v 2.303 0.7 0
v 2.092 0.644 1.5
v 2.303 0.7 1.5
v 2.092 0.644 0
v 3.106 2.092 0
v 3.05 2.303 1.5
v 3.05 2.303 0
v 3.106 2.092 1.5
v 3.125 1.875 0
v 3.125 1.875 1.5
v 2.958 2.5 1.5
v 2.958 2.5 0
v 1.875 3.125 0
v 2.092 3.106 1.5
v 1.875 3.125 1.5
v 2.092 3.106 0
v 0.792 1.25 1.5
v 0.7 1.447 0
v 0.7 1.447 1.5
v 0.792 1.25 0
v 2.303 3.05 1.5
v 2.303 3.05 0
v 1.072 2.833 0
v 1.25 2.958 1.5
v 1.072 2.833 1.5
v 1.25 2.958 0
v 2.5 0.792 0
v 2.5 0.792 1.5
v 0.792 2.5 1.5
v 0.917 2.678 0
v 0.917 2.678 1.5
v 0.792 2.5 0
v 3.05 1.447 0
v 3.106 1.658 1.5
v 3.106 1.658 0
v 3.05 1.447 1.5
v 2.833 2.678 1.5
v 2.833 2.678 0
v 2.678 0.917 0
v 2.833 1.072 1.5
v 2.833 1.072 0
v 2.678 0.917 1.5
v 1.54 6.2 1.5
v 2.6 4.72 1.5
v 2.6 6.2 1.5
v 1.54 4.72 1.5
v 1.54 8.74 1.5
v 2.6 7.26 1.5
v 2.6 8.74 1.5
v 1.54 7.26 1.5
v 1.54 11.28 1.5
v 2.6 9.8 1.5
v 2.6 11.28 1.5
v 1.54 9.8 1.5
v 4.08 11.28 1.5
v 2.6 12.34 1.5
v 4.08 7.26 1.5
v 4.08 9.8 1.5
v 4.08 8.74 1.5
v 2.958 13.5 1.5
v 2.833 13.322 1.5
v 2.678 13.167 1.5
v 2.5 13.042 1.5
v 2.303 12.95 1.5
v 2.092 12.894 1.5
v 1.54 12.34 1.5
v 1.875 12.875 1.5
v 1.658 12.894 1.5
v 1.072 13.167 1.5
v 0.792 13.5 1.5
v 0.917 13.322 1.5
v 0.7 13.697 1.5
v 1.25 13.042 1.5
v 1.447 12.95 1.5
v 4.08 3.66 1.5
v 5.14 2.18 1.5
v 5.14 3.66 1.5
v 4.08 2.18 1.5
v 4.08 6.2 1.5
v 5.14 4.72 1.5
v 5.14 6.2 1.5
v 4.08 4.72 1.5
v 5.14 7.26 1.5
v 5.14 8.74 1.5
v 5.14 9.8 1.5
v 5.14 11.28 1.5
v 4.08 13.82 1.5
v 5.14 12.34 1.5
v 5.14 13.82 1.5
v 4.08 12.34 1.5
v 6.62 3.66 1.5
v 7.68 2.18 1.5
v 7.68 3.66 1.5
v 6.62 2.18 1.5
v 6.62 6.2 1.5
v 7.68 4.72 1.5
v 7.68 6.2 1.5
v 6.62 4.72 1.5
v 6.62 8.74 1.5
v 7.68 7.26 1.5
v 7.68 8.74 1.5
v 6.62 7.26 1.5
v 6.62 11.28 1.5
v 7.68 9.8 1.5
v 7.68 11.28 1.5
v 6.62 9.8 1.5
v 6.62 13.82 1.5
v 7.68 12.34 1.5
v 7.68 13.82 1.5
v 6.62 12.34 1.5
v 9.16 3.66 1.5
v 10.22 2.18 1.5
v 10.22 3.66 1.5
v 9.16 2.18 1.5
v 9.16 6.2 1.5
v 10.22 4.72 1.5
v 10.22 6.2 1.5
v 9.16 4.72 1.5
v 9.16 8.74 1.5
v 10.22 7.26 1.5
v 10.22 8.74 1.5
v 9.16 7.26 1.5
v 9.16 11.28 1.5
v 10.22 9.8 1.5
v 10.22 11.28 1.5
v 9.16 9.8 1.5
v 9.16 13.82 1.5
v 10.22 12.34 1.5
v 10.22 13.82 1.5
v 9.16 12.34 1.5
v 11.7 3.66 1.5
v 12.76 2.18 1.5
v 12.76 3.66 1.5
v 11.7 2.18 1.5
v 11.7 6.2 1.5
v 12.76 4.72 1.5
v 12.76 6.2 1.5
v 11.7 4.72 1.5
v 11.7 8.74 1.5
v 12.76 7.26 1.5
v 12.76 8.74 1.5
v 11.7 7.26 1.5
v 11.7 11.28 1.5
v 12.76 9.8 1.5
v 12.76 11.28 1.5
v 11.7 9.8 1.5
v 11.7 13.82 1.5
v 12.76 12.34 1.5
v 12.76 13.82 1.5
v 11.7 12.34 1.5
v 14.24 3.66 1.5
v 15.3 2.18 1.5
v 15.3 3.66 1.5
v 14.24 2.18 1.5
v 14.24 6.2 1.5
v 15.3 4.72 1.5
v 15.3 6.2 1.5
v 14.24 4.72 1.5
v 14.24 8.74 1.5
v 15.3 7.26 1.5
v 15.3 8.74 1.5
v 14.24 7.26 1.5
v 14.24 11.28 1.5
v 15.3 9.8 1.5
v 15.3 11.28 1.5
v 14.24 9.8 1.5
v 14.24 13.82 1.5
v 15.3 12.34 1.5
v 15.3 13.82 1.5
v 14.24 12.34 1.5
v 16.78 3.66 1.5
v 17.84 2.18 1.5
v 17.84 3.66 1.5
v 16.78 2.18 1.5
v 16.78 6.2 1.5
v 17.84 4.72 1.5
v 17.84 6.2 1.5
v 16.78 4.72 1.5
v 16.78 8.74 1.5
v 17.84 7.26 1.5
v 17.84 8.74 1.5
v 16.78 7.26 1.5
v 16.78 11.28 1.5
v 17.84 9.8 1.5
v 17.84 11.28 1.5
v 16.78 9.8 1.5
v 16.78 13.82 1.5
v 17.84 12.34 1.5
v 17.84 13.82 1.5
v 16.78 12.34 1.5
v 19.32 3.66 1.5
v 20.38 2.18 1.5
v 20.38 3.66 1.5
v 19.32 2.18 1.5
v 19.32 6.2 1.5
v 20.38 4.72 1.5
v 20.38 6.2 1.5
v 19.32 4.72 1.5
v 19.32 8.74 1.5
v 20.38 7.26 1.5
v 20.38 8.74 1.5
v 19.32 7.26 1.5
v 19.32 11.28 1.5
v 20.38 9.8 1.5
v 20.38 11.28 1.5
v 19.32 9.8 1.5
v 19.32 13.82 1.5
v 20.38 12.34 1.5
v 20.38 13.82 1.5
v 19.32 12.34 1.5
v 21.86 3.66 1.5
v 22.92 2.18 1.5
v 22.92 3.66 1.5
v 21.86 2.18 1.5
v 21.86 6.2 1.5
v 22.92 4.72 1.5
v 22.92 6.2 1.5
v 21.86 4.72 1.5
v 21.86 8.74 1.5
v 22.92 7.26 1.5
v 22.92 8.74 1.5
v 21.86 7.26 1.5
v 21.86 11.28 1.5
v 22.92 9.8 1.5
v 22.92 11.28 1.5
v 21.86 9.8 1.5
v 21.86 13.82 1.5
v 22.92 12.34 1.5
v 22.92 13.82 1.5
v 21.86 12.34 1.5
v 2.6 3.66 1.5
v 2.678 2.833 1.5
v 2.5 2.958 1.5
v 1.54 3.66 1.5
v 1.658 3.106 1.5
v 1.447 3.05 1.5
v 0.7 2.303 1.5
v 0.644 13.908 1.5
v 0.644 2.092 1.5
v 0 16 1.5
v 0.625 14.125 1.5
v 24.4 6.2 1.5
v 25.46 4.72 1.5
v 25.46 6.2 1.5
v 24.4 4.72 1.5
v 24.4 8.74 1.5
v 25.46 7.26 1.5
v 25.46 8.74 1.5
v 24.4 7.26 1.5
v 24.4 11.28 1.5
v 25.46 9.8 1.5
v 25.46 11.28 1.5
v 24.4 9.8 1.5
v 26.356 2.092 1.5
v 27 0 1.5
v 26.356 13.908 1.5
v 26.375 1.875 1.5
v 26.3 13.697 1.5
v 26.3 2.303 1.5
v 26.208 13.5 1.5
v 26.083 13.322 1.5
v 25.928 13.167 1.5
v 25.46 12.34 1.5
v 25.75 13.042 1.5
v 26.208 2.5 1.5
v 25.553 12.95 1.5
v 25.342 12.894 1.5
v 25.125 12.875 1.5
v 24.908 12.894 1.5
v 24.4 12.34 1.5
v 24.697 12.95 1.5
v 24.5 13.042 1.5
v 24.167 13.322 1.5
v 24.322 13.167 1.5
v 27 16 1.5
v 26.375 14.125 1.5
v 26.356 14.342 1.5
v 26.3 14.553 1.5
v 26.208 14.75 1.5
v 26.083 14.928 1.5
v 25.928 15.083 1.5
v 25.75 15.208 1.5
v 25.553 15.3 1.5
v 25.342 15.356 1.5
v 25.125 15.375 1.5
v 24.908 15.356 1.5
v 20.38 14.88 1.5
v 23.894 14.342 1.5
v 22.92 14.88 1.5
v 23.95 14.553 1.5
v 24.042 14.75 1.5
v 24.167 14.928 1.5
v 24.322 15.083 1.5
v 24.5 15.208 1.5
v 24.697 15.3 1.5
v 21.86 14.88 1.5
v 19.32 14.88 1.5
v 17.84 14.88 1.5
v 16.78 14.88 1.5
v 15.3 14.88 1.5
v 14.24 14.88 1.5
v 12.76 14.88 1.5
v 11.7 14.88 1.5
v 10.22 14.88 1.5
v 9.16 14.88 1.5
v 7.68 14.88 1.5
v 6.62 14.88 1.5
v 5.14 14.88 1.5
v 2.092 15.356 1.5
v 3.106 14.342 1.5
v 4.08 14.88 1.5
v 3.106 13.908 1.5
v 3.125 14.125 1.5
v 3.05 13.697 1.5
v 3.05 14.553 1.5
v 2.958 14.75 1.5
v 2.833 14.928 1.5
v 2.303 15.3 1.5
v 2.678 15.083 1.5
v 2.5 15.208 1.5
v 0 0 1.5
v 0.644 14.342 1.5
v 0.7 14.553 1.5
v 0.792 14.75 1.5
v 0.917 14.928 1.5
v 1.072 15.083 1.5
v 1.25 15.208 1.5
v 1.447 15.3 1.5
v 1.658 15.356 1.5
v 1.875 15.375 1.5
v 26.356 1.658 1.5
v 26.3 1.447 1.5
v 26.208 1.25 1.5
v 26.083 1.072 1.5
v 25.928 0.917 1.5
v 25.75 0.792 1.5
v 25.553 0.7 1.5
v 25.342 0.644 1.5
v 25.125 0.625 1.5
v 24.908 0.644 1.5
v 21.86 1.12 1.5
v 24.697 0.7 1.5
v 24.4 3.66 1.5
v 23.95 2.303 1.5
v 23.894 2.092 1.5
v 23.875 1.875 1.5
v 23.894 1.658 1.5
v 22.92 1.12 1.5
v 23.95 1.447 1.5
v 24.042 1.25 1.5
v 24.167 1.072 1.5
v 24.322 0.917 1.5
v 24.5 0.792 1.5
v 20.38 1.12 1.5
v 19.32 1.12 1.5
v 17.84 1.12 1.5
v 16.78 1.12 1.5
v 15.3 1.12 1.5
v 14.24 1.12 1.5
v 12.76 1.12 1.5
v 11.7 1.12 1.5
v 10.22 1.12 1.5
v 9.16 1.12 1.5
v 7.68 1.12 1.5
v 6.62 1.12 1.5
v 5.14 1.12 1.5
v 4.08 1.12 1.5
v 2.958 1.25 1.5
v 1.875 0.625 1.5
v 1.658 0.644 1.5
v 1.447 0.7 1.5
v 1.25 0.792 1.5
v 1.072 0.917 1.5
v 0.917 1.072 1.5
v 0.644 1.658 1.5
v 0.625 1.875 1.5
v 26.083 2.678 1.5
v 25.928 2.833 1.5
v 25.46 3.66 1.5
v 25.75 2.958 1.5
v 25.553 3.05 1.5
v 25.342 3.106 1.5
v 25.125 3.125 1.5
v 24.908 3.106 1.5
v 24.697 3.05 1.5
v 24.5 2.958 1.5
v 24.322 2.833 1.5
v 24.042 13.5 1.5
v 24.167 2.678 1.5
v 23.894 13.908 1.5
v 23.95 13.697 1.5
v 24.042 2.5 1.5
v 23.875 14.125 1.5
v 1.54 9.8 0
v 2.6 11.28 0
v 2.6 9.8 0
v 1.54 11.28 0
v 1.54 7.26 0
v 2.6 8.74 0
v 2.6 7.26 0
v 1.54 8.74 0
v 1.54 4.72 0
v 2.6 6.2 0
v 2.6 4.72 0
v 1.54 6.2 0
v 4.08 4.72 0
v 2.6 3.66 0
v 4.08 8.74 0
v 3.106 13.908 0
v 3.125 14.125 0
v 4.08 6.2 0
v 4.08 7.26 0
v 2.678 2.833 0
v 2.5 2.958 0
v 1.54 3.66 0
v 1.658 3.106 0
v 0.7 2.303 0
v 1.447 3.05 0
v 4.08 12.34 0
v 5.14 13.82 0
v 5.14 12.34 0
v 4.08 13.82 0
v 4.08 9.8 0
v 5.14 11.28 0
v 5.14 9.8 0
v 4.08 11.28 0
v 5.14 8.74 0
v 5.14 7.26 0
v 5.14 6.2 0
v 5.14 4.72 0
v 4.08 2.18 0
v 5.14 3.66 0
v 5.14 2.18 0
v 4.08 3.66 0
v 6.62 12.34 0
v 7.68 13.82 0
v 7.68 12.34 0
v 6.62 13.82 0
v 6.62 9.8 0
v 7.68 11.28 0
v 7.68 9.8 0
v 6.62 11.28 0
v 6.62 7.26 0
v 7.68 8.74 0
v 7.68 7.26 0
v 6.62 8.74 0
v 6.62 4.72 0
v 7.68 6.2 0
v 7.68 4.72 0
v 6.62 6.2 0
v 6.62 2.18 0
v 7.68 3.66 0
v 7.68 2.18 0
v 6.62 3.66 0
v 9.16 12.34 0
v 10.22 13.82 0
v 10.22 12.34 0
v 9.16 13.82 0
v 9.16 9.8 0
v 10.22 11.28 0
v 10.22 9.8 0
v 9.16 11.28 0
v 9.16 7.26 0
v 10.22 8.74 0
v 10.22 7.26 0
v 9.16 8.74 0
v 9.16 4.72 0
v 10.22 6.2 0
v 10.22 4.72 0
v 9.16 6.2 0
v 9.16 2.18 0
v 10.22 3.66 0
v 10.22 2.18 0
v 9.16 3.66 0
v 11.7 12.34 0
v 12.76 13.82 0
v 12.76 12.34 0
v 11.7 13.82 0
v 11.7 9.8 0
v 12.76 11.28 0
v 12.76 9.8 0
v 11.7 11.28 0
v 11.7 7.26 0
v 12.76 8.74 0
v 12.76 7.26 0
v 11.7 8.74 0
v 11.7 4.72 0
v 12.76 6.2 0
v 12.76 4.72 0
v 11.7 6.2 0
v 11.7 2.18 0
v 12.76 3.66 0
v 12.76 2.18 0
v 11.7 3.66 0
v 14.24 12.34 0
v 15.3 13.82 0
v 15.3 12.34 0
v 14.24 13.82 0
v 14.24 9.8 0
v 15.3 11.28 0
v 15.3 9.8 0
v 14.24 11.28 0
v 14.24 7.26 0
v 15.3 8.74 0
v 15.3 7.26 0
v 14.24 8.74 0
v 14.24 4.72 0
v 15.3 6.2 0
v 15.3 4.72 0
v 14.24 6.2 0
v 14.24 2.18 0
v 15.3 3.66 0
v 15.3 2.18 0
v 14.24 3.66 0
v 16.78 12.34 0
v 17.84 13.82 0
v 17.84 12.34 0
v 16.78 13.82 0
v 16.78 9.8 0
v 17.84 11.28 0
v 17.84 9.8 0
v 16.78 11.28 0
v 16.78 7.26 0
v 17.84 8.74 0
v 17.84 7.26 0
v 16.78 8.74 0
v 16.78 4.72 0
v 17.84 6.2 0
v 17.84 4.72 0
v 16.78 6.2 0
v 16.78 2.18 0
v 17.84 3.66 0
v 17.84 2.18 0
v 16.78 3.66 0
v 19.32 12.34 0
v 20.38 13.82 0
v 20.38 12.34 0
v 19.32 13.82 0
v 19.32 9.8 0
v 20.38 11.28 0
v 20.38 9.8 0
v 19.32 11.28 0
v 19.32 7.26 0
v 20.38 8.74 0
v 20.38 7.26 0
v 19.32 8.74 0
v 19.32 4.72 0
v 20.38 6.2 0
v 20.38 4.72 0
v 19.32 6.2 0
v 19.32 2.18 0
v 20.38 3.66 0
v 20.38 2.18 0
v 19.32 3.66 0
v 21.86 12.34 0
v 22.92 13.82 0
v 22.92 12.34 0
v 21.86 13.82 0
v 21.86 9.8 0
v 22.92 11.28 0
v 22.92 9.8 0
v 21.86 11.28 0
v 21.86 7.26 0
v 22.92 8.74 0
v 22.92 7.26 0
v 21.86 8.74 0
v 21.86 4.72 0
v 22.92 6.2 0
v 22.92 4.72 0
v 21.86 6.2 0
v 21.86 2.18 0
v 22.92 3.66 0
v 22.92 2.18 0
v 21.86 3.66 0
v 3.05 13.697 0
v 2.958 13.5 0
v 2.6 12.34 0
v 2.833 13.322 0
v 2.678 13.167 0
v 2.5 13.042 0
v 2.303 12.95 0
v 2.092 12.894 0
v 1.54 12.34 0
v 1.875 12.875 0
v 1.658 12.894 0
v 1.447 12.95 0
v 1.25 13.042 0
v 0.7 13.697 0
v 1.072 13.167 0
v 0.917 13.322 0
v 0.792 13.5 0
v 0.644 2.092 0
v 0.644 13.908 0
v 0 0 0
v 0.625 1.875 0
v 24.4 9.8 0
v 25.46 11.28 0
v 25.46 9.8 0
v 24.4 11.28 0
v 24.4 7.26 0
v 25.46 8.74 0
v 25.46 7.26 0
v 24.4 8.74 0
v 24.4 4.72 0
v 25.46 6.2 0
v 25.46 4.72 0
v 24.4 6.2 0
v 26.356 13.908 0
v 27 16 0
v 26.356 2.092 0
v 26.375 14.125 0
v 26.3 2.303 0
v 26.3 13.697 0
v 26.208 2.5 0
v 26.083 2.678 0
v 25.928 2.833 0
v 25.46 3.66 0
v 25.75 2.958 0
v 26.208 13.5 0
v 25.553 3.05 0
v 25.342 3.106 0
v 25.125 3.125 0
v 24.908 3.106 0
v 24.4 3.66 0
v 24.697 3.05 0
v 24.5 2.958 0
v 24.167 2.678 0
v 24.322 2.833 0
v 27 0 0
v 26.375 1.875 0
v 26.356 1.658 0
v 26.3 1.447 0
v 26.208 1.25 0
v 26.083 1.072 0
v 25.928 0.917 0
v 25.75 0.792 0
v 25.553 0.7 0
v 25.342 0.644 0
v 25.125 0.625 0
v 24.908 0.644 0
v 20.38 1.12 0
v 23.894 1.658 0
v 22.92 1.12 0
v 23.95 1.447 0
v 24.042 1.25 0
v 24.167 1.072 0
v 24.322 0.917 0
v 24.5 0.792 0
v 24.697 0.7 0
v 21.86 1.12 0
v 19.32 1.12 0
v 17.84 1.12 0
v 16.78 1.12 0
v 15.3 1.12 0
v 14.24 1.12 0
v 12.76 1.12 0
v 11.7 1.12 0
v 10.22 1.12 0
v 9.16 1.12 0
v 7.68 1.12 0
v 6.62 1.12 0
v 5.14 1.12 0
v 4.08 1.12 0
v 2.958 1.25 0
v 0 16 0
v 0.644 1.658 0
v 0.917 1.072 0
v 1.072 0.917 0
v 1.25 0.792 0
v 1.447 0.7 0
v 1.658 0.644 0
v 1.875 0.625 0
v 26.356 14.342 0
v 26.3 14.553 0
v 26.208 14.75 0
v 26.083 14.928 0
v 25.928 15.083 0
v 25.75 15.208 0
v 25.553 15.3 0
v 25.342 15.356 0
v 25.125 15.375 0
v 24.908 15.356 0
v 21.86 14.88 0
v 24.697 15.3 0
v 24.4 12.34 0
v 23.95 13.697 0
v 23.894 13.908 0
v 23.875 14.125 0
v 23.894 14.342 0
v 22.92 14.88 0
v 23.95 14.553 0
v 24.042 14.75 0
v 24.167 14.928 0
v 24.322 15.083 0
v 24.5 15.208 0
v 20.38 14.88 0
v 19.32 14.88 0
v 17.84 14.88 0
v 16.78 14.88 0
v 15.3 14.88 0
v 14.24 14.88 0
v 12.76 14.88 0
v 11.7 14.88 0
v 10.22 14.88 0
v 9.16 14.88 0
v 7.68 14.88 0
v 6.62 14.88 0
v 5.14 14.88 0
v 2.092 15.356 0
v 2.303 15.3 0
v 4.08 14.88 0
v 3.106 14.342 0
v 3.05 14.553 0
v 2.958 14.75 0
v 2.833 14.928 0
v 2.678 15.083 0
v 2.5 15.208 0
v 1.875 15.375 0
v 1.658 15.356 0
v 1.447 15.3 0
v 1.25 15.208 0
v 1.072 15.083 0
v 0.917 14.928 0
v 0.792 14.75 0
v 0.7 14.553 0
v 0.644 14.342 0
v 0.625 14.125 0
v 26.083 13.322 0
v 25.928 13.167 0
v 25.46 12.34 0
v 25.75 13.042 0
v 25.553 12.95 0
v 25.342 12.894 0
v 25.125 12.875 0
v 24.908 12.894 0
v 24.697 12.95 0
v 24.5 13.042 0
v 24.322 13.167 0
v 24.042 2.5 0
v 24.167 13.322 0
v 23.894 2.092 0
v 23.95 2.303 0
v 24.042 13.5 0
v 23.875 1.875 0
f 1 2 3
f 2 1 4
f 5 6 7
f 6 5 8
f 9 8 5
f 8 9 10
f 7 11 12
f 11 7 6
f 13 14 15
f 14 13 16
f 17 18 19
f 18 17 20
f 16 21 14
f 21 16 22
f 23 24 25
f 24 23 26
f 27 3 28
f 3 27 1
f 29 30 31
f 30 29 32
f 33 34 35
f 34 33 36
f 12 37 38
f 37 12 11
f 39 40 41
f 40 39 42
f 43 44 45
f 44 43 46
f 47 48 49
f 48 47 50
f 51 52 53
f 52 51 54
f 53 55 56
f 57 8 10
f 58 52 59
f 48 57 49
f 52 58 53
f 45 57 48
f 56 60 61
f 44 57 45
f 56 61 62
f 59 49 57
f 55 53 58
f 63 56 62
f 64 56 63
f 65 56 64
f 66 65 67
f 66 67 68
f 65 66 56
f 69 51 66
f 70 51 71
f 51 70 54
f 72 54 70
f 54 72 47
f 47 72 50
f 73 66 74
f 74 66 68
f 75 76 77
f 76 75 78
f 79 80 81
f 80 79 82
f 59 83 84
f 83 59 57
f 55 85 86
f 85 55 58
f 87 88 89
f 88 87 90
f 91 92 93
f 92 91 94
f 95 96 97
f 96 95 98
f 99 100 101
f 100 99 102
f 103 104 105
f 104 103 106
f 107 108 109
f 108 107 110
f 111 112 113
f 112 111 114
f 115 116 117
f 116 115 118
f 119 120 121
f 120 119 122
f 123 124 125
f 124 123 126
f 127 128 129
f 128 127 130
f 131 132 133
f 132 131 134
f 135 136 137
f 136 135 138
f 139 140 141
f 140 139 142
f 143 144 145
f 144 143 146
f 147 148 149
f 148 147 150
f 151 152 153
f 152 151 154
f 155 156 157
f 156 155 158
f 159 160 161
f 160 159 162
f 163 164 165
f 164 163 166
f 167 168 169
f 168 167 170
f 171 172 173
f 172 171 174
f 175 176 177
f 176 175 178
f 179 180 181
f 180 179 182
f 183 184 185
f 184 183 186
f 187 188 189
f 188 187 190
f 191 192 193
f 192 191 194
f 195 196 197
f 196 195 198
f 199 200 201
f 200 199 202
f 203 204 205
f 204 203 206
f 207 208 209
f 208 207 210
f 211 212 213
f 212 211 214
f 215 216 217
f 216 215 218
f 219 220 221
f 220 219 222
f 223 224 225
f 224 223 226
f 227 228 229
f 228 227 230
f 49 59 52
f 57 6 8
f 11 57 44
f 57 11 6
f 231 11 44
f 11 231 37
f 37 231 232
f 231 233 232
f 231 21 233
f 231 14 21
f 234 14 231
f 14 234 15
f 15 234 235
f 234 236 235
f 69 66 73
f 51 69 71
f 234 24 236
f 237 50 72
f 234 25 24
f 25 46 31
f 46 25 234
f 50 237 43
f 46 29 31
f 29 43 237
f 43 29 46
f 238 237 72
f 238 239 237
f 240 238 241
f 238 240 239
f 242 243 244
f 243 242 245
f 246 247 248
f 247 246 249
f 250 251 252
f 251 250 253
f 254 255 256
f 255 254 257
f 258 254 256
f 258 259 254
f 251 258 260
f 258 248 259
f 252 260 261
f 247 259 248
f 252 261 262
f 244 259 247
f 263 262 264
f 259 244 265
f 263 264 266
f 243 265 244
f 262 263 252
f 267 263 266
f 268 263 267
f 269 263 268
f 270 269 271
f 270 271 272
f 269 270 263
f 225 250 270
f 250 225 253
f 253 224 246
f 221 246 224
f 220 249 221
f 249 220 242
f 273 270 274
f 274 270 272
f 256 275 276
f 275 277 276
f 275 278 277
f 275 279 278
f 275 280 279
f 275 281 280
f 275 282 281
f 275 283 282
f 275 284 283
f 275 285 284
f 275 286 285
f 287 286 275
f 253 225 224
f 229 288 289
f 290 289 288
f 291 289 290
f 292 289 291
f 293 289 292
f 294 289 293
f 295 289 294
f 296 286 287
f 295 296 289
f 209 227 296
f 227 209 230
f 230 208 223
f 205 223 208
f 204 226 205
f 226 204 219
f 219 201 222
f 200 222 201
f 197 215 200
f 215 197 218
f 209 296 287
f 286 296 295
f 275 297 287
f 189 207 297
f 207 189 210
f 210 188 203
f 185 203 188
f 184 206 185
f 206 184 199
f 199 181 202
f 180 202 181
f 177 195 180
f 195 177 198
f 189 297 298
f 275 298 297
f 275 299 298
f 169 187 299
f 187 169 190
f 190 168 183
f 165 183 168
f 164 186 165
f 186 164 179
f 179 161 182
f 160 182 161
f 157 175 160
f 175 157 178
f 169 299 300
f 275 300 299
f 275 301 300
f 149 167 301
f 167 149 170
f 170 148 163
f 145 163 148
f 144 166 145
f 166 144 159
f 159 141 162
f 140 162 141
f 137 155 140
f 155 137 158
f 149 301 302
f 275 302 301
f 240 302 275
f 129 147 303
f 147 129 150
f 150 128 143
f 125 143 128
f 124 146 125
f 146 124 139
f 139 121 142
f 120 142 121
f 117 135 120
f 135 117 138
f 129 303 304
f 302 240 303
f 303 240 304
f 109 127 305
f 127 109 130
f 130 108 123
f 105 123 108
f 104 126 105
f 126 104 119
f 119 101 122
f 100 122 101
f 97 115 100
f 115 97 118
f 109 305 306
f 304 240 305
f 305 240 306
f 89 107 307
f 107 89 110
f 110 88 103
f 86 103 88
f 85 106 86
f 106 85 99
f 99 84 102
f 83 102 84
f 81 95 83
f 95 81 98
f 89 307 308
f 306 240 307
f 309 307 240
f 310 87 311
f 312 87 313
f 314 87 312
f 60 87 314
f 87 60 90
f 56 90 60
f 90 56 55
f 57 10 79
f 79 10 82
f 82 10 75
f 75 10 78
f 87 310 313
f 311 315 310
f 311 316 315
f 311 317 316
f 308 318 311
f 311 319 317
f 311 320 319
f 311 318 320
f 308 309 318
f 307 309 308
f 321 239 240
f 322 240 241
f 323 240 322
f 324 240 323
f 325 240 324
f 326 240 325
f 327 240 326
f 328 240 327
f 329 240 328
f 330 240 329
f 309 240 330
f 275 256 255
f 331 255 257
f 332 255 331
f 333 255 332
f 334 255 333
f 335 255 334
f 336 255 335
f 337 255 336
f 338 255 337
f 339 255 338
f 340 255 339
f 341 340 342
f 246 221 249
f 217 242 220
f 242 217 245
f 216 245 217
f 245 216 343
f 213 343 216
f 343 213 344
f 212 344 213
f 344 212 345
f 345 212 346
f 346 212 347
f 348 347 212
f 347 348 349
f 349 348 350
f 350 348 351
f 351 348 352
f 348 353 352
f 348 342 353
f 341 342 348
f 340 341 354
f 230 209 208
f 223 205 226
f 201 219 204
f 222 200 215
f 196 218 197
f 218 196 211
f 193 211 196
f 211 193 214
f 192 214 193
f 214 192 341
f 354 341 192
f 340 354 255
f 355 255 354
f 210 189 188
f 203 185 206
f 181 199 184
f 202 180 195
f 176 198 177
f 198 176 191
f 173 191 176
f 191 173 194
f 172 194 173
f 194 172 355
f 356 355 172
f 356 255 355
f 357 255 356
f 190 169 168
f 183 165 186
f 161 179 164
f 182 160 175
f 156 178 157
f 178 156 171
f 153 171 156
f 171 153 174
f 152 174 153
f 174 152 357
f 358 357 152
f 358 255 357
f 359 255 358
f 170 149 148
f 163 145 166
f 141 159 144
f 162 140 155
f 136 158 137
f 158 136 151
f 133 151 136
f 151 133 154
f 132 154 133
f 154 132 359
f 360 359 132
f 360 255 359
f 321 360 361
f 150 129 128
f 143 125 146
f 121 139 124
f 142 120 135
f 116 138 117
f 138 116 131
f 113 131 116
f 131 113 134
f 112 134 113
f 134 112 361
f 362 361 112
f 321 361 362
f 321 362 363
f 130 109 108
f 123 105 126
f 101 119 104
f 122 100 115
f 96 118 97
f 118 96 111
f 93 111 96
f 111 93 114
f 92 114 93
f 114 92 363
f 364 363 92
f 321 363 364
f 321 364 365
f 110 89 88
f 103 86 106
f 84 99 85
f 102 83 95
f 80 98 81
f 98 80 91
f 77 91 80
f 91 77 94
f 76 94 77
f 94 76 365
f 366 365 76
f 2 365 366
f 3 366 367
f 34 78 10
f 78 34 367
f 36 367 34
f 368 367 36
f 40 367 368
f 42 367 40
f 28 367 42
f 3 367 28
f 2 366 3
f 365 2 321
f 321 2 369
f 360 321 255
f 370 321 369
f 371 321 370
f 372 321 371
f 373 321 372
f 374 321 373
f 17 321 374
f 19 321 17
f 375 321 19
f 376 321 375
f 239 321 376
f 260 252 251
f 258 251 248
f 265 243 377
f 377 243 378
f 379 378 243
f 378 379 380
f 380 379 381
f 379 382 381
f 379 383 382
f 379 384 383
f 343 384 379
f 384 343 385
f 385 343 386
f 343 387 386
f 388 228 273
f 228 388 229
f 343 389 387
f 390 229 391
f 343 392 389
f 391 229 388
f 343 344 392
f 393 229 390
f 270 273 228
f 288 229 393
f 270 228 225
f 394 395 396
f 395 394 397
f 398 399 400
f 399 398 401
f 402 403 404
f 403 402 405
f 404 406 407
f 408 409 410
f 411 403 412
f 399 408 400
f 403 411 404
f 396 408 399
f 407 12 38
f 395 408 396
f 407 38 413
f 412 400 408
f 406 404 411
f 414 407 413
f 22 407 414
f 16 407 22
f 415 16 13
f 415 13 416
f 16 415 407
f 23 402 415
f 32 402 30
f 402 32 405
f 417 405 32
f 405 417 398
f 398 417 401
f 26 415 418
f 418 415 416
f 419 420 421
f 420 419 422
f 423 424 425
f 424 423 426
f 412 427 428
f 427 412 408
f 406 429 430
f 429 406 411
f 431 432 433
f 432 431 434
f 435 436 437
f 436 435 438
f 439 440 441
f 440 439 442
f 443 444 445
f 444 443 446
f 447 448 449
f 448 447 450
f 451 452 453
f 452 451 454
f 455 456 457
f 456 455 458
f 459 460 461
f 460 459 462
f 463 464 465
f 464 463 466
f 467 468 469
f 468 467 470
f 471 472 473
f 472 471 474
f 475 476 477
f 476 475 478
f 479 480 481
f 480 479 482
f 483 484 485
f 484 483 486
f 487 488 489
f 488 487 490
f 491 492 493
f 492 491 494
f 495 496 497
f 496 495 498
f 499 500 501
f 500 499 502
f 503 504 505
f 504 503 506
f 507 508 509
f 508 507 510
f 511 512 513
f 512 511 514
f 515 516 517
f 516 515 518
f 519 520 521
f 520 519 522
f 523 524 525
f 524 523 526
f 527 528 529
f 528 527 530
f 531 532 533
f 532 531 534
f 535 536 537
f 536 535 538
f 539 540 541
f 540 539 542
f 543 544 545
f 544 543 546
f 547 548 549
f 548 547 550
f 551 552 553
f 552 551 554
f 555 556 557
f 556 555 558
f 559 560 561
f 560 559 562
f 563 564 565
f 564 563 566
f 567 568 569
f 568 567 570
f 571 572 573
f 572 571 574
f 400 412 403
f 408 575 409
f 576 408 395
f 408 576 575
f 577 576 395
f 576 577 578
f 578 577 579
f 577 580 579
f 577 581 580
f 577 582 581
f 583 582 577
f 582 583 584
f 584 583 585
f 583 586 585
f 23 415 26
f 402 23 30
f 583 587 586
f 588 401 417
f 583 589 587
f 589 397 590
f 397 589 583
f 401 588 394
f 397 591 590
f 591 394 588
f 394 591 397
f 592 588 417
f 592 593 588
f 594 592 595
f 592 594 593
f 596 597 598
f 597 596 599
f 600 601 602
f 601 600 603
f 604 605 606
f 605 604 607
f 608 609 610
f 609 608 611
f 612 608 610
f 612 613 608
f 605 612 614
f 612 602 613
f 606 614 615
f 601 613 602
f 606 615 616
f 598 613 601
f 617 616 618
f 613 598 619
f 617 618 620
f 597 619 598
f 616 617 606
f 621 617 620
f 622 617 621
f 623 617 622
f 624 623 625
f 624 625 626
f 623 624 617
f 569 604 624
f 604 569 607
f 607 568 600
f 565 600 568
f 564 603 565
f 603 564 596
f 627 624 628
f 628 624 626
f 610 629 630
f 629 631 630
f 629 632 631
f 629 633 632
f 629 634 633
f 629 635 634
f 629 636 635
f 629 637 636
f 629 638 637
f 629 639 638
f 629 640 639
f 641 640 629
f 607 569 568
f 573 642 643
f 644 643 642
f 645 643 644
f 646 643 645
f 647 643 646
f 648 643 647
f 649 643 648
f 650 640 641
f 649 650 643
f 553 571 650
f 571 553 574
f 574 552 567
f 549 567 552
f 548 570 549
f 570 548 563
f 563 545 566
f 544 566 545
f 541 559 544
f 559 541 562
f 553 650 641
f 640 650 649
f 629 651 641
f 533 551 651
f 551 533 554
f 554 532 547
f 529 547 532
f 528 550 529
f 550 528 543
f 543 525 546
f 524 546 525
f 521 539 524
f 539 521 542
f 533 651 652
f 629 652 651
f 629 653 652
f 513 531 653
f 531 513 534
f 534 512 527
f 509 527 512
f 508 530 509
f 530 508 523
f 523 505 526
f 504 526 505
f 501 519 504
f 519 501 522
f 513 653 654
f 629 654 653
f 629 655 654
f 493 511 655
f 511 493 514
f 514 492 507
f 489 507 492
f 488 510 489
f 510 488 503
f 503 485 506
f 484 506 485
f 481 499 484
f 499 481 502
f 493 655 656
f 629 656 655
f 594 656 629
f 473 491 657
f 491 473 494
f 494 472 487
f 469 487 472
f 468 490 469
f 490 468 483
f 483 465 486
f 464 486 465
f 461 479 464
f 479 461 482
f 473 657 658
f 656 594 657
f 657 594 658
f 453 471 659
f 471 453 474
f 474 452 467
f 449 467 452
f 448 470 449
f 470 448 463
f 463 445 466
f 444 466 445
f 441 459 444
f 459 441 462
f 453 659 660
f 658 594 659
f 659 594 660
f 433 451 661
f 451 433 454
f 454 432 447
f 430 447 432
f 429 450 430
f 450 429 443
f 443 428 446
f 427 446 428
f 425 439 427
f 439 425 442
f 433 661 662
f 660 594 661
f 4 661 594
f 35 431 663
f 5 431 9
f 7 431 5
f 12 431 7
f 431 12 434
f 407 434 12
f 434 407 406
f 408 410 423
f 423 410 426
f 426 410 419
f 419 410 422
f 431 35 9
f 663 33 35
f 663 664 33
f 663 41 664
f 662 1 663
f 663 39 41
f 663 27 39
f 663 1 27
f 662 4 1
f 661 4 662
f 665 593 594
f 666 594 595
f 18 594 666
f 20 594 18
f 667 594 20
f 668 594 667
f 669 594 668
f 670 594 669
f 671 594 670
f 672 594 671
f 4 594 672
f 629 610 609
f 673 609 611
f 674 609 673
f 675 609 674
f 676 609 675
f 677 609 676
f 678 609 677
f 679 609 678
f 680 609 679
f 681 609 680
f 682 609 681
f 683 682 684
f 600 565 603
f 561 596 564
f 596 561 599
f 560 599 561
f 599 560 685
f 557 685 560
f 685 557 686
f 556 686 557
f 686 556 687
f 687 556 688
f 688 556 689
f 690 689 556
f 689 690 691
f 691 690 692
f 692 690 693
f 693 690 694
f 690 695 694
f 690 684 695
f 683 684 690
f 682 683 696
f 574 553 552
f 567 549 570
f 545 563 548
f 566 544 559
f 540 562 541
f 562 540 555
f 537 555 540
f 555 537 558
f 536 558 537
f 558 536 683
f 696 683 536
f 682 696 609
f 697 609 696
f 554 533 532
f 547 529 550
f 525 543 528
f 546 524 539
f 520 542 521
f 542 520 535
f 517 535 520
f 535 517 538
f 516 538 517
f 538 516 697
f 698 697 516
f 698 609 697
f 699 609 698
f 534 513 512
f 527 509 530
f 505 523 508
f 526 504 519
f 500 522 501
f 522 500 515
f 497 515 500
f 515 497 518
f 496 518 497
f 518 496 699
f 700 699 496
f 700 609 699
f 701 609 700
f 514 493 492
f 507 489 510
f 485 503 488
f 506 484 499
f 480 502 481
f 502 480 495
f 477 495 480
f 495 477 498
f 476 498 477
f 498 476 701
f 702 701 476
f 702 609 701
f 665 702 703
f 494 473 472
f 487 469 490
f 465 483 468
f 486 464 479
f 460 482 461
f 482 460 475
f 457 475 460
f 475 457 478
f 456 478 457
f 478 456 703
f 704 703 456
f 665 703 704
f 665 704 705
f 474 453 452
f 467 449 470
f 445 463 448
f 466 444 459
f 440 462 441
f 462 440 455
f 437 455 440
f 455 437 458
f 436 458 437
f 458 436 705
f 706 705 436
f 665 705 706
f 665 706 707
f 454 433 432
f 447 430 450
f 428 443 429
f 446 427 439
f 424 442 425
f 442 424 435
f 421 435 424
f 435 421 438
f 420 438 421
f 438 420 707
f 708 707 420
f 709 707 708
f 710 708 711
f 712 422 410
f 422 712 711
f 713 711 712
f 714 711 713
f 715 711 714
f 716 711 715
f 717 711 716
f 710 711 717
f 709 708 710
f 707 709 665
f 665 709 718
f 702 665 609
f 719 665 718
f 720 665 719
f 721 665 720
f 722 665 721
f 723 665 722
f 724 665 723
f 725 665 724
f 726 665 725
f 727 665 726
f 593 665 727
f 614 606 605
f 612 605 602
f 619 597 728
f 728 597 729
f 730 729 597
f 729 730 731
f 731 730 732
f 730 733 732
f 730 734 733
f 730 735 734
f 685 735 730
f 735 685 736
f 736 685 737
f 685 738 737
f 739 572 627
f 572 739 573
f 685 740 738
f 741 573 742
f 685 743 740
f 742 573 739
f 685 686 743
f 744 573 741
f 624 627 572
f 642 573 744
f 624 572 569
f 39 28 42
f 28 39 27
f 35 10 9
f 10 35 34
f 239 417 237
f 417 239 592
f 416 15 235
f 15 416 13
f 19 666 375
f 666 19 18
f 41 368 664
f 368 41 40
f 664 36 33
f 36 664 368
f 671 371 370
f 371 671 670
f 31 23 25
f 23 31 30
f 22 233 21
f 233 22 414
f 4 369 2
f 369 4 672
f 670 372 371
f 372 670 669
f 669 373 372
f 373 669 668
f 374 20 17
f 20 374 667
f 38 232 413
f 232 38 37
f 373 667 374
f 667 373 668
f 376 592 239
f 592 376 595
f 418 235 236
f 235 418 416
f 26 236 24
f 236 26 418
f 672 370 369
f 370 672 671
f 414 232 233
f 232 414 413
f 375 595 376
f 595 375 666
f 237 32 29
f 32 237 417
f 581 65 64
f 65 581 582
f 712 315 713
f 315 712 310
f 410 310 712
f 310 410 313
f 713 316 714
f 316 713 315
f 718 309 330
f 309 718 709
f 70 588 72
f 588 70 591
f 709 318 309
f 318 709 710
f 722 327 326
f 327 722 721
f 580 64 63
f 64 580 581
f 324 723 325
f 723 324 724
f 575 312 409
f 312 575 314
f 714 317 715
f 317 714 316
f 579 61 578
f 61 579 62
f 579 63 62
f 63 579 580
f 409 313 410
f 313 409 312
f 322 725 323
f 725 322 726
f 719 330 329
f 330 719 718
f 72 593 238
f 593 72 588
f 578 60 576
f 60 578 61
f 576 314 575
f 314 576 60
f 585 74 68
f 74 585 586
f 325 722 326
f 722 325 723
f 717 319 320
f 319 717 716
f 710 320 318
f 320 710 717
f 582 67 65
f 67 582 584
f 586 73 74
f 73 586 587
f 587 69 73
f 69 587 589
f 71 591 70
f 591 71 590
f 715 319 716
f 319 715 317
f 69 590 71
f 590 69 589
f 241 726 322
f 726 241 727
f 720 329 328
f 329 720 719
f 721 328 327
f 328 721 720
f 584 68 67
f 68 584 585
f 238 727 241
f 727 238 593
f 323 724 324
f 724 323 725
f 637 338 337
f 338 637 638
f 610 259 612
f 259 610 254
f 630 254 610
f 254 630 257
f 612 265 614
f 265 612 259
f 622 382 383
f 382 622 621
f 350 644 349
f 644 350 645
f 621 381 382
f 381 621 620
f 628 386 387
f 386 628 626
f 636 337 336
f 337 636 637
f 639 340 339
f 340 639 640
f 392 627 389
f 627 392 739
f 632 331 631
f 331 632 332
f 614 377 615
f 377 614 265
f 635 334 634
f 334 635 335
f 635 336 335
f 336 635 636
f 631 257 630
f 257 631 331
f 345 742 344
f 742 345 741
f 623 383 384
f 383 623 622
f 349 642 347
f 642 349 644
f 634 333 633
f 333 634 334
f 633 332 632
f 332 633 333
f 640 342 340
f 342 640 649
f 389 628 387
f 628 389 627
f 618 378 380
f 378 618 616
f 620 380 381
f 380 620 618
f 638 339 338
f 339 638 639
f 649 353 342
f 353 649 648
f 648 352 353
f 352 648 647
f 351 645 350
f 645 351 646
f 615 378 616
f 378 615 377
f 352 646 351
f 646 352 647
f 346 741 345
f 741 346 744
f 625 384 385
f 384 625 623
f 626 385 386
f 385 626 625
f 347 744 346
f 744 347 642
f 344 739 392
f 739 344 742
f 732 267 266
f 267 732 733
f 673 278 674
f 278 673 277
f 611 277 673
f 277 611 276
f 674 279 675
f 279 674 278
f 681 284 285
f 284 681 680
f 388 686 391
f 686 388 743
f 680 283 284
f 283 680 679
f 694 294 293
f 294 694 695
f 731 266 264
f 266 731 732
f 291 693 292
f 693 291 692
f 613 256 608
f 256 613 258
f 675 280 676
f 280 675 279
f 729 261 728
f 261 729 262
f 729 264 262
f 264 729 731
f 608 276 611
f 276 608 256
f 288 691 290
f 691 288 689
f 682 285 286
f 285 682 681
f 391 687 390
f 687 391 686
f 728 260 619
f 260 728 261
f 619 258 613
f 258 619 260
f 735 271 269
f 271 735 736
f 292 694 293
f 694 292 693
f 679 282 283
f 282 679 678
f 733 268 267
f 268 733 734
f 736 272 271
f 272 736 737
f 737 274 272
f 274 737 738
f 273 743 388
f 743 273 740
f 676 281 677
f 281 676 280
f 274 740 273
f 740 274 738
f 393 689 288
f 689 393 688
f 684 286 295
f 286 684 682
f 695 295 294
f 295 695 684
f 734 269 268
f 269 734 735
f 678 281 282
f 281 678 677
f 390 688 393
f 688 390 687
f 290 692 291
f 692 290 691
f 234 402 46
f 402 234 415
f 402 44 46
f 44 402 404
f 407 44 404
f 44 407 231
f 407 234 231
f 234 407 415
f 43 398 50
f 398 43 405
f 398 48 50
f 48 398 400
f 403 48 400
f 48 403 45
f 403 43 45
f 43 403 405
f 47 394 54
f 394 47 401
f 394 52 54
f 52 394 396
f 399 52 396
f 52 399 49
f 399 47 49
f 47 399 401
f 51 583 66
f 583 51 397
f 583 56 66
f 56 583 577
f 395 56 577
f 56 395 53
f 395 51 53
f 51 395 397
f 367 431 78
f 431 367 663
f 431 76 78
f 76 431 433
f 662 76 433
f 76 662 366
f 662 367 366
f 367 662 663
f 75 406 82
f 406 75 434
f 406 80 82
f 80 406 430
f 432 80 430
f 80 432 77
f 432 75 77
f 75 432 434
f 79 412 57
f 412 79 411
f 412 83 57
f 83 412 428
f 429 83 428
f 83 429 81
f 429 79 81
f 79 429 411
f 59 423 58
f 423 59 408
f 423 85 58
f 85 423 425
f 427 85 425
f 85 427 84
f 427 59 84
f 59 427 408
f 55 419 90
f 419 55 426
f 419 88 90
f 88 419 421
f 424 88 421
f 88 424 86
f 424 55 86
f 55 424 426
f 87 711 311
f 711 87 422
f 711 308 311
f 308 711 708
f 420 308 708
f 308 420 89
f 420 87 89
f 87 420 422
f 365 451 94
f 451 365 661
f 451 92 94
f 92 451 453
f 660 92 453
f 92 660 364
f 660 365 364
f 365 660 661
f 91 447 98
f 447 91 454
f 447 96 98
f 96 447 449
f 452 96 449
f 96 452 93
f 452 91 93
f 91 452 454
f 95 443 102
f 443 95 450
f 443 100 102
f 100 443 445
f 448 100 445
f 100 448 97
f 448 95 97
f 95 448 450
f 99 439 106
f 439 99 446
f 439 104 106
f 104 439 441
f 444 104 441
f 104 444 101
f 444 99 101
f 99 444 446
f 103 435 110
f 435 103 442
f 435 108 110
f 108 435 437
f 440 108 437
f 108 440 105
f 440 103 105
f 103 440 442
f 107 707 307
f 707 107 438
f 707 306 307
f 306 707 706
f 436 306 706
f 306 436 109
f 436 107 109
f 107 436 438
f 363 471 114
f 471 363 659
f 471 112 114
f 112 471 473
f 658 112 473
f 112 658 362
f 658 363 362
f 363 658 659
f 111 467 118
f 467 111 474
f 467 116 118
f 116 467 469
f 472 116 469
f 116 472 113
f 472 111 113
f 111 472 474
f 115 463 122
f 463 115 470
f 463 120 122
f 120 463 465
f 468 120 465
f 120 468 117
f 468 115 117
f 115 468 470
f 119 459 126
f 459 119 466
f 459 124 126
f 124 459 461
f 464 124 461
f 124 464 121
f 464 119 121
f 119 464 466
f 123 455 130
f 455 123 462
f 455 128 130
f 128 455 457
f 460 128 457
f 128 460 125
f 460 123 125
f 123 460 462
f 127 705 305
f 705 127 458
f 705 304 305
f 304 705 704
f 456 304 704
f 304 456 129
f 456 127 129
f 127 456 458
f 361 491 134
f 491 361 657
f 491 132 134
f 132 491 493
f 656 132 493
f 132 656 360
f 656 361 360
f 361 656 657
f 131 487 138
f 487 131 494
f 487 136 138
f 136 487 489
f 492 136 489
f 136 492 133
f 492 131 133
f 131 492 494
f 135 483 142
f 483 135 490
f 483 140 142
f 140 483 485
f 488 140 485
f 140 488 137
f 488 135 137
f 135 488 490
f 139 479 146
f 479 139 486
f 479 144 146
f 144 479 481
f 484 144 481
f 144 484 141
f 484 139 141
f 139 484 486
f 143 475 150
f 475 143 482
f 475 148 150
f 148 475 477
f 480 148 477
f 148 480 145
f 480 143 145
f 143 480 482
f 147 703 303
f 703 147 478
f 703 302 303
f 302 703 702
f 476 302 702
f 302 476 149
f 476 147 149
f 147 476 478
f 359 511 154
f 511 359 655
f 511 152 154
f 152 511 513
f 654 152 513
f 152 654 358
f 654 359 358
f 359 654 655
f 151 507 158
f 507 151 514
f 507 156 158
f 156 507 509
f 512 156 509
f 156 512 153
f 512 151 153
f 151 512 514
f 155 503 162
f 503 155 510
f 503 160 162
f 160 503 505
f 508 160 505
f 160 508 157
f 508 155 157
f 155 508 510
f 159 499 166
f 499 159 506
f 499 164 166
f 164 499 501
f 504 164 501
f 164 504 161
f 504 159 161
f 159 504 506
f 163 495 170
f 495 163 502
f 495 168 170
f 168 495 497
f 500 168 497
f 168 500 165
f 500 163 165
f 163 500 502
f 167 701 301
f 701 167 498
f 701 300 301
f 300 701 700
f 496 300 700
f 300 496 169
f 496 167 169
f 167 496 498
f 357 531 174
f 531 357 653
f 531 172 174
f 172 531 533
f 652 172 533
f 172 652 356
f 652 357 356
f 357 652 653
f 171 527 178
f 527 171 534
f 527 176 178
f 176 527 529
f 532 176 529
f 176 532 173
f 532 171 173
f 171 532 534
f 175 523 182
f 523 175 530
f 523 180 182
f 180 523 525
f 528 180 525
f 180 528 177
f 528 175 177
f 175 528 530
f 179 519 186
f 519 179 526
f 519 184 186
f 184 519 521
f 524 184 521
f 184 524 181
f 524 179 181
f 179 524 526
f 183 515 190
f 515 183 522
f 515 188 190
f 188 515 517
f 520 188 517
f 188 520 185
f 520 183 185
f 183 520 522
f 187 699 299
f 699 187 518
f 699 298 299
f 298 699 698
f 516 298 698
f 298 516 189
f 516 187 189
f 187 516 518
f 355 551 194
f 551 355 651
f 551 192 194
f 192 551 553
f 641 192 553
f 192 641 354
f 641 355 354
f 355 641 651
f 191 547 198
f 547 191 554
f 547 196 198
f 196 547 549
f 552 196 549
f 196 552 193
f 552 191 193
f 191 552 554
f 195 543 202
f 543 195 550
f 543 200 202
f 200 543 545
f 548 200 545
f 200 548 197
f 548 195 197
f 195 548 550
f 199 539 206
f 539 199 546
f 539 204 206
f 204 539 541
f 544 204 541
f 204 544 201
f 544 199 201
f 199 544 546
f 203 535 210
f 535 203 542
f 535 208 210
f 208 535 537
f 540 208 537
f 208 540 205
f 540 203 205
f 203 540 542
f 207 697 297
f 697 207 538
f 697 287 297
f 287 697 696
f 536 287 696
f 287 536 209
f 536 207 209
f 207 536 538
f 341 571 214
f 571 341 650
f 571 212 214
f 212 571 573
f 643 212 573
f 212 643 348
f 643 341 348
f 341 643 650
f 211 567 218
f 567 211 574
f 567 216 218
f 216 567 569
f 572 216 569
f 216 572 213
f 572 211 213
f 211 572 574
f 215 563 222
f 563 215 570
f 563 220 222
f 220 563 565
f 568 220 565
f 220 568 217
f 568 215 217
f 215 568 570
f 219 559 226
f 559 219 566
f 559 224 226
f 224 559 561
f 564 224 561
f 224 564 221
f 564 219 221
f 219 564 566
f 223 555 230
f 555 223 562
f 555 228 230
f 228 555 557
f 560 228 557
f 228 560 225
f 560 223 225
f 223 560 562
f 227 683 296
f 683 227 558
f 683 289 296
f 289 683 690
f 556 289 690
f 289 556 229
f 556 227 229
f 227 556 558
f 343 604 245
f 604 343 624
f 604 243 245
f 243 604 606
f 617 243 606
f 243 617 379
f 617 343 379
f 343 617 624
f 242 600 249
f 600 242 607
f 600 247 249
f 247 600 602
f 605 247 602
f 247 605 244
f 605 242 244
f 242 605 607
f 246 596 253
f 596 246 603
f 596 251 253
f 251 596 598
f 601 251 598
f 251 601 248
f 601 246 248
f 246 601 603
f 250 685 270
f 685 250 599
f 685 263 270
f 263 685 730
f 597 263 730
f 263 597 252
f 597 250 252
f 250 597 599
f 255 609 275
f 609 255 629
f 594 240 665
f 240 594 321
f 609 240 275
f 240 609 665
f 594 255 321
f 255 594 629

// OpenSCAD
/* 
Parametric Perfboard for electronics
with or without screw holes
*/


boardLength = 27; //Length in MM
boardWidth = 16; //Width in MM
boardThickness =1.5; //Thickness in MM
//Add screw holes (true or false)
screwHoles = 1; //[1:true,0:false]
screwHoleDiameter =  2.5; //Screw Hole Diameter

holesModuloX = (boardLength%2.54);
holesModuloY = (boardWidth%2.54);
holesLength = (boardLength-holesModuloX)/2.54;
holesWidth = (boardWidth-holesModuloY)/2.54;


boardLayout();
//throughHole();
//throughHoleLayout();

module boardLayout(){
    difference(){
        boardFlat();
        if (screwHoles==1)
            screwHolesLayout();
        throughHoleLayout();
    }
    dimensions();
}
module dimensions(){
    echo("Dimensions ",boardLength,"x",boardWidth,"x",boardThickness);
    echo("Hole Pattern ",holesLength,"x",holesWidth);
    if (screwHoles==1)
    echo("Screw Locations on center ", boardLength-screwHoleDiameter*6/4,"x",boardWidth-screwHoleDiameter*6/4);
}

module screwHolesLayout(){
    translate([0+screwHoleDiameter/4,0+screwHoleDiameter/4,0]) screwHole();
    translate([0+screwHoleDiameter/4,boardWidth-screwHoleDiameter*5/4,0]) screwHole();
    translate([boardLength-screwHoleDiameter*5/4,0+screwHoleDiameter/4,0]) screwHole();
    translate([boardLength-screwHoleDiameter*5/4,boardWidth-screwHoleDiameter*5/4,0]) screwHole();
    
}
module throughHoleLayout(){
    translate([holesModuloX/2,holesModuloY/2,0]){
        for (x = [1:holesLength]){
            for(y=[1:holesWidth]){
                translate([x*2.54-2.54/2,y*2.54-2.54/2,0]) throughHole();
            }
        }
    }
}


module boardFlat(){
    translate([]) cube([boardLength,boardWidth,boardThickness]);
}
module throughHole(){
    translate([0,0,boardThickness/2]) rotate([0,0,45]) cylinder (d=1.5,h=boardThickness,center=true,$fn=4);
}
module screwHole(){
    translate([screwHoleDiameter/2,screwHoleDiameter/2,boardThickness/2]) cylinder(d=screwHoleDiameter,h=boardThickness,center=true,$fn=36);
}
